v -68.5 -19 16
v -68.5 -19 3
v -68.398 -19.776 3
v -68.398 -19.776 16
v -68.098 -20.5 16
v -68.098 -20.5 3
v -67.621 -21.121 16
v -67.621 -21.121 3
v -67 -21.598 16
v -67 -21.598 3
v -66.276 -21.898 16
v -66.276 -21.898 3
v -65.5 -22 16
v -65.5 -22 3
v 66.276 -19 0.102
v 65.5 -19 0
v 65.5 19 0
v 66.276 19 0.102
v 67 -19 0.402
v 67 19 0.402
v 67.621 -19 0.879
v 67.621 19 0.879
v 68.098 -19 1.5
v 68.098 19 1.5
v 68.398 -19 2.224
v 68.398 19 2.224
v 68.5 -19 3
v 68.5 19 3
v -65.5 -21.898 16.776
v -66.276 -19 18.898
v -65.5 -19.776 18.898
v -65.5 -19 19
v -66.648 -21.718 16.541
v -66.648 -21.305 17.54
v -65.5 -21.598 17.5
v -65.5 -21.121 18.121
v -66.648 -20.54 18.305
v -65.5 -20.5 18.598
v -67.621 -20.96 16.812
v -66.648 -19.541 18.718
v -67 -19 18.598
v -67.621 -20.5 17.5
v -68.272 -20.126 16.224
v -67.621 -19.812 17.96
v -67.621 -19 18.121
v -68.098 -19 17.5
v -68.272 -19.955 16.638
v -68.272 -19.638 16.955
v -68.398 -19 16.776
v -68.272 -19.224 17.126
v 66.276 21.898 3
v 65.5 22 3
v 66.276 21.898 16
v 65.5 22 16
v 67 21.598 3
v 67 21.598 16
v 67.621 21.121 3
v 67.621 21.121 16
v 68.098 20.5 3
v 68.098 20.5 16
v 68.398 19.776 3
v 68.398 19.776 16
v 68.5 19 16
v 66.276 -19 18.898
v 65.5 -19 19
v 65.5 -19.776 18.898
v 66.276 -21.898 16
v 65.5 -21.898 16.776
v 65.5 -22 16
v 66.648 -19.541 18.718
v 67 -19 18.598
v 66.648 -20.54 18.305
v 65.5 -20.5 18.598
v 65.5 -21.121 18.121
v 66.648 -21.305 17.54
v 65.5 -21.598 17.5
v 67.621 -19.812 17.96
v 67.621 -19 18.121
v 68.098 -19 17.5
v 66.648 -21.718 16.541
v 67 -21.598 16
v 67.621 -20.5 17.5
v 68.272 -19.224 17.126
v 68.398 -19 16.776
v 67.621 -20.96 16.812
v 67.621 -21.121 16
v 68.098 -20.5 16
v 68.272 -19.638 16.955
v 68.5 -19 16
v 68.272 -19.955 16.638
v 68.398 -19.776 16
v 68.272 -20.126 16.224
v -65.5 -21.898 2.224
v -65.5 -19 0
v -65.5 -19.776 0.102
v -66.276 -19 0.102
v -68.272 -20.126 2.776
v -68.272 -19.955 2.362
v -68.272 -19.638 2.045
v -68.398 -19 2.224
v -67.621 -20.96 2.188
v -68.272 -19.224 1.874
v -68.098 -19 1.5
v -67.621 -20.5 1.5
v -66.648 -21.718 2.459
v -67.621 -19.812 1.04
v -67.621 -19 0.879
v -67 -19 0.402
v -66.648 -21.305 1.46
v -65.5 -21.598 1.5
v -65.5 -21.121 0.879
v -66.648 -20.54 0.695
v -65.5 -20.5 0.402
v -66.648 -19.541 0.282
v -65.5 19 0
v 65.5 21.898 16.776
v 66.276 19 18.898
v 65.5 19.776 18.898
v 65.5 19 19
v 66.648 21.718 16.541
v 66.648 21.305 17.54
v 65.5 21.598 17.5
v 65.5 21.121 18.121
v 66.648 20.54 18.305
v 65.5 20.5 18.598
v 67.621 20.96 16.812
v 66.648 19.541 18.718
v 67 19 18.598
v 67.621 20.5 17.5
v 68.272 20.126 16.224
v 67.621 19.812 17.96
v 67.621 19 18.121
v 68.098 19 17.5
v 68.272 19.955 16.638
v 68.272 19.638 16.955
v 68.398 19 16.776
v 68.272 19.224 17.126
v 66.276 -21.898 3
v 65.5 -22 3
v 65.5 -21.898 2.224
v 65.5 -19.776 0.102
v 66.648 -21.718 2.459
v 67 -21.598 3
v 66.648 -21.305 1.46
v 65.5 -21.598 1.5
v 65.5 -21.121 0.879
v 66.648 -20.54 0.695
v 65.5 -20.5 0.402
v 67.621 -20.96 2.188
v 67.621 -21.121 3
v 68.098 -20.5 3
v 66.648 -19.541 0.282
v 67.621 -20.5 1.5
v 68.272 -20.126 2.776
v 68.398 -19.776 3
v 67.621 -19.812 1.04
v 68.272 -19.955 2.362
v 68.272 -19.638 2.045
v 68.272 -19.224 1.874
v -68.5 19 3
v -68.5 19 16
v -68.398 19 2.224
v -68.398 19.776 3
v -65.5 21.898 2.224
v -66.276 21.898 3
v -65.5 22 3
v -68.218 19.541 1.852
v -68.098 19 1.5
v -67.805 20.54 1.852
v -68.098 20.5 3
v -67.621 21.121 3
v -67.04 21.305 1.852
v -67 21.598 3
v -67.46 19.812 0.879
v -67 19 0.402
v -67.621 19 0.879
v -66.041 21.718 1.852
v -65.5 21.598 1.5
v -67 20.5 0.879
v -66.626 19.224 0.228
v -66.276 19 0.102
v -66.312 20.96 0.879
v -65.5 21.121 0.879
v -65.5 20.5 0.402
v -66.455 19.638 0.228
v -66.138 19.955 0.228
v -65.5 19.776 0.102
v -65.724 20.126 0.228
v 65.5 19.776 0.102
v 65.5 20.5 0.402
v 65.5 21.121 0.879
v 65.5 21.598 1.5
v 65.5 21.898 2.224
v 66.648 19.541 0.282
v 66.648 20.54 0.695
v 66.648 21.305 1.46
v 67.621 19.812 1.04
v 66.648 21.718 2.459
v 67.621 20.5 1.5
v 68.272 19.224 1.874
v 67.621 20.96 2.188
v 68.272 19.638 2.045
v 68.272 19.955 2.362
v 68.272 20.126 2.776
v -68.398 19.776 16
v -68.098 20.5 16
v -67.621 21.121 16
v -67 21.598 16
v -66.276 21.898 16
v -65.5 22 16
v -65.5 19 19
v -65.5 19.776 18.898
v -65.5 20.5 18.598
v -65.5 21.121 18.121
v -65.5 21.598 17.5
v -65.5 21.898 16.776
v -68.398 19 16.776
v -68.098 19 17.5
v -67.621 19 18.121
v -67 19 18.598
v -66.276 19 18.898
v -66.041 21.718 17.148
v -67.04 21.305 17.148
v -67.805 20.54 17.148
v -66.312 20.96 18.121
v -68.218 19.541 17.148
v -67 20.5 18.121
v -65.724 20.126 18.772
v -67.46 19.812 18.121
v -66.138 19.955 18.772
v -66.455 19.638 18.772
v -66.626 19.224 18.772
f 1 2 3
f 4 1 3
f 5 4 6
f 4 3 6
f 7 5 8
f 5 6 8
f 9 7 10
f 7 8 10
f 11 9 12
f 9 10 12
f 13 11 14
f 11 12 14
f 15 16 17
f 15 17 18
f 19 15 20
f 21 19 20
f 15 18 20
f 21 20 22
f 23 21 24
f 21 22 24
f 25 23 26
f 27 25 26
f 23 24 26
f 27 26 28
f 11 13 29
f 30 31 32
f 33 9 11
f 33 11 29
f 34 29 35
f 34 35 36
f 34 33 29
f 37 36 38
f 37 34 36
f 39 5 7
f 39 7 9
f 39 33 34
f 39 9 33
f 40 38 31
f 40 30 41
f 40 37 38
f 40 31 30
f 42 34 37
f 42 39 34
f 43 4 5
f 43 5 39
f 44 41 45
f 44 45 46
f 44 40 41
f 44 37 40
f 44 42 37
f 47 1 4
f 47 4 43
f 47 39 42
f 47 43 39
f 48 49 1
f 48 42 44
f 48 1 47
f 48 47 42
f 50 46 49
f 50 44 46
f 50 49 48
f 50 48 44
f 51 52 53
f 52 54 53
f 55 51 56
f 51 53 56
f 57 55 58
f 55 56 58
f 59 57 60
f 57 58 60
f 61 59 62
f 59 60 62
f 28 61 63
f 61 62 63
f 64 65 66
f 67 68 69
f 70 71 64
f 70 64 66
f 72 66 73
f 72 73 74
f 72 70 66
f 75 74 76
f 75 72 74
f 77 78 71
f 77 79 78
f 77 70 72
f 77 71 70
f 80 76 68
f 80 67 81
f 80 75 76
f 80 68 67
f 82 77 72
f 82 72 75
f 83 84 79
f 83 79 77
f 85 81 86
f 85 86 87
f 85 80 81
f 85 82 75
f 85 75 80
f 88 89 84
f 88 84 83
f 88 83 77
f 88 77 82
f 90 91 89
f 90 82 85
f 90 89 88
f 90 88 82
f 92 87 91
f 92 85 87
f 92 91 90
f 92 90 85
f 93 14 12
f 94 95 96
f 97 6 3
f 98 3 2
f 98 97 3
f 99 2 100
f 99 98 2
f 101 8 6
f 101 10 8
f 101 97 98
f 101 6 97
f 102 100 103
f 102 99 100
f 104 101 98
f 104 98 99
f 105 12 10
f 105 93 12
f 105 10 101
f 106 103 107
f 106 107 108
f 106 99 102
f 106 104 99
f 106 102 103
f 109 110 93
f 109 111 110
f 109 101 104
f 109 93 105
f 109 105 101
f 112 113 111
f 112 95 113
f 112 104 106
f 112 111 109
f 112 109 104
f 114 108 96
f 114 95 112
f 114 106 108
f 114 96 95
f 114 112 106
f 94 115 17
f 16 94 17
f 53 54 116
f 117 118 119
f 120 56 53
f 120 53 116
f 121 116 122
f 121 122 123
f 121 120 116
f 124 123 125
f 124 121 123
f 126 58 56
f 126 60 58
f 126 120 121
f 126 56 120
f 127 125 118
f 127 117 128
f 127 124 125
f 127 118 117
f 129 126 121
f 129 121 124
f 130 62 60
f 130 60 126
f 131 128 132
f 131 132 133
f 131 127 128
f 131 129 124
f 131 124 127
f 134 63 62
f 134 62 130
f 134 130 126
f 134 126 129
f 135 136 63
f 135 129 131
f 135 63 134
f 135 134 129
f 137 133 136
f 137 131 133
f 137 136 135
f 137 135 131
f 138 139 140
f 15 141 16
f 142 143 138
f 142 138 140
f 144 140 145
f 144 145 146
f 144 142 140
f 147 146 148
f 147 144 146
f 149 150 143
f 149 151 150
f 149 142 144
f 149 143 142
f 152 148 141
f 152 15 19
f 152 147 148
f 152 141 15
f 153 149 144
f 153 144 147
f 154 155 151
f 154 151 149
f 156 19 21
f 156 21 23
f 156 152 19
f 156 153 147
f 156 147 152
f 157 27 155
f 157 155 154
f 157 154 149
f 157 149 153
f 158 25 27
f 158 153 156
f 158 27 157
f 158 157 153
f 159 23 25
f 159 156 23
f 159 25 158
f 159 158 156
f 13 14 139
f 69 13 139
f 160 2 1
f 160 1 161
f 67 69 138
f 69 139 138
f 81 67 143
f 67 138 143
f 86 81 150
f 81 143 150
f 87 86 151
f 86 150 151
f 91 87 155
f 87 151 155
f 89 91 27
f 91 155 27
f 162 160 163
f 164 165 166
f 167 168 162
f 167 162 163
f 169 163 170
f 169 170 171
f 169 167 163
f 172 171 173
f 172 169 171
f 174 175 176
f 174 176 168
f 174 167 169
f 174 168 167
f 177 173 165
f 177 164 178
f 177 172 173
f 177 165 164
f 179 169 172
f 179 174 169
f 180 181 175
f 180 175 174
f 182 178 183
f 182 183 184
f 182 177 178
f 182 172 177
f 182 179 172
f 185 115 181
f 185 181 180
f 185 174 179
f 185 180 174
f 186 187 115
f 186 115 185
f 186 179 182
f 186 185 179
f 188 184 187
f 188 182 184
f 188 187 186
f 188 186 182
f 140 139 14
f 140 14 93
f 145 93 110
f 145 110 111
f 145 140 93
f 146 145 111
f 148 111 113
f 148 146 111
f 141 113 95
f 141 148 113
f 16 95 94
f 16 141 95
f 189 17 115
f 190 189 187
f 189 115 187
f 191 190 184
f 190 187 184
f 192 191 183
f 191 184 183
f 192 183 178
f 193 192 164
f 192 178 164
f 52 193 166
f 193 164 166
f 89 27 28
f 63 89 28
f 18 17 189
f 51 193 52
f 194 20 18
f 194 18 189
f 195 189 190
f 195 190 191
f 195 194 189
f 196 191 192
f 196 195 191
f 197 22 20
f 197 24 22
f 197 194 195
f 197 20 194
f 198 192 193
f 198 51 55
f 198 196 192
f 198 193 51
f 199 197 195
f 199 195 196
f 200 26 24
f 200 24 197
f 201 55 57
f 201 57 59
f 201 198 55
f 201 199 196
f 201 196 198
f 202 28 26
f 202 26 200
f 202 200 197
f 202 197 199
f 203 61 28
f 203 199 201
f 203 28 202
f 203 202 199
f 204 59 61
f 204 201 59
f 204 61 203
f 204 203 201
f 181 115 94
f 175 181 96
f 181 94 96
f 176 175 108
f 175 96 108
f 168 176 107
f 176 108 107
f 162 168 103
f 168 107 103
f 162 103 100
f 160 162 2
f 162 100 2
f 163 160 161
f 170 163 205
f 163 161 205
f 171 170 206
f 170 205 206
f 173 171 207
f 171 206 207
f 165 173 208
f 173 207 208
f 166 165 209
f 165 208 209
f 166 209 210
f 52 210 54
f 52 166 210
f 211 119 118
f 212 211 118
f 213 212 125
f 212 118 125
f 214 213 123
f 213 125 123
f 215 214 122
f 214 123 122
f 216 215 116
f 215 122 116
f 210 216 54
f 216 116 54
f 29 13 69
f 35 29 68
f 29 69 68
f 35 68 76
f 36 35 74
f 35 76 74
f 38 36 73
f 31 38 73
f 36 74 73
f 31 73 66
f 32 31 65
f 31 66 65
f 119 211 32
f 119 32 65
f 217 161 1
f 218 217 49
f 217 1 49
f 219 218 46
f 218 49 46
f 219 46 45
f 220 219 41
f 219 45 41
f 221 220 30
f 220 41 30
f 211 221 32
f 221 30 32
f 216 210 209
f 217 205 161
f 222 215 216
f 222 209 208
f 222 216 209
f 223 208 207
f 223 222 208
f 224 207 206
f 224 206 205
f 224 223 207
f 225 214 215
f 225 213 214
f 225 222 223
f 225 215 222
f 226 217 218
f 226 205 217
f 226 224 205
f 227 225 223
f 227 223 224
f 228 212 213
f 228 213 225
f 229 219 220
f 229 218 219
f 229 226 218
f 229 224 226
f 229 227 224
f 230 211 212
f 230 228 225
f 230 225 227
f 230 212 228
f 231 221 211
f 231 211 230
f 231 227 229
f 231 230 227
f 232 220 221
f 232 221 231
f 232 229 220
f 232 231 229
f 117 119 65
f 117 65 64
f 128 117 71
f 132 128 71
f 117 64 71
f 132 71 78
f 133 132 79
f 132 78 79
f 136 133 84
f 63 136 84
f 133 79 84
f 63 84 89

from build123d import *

# Parameters (mm, degrees)
CROQUIS2_W              = 137
CROQUIS2_H              = 44
SALIENTE_EXTRUIR1_DEPTH = 19
REDONDEO3_R             = 3
REDONDEO4_R             = 3
REDONDEO5_R             = 3
REDONDEO6_R             = 3
REDONDEO7_R             = 3


with BuildPart() as part:
    # Croquis2 → Saliente-Extruir1 (new body)
    with BuildSketch(Plane.XY):
        Rectangle(CROQUIS2_W, CROQUIS2_H)
    extrude(amount=SALIENTE_EXTRUIR1_DEPTH)

    # Redondeo3
    redondeo3_edges = [part.edges().sort_by_distance(p)[0] for p in [
        (0, -22, 0),
    ]]
    fillet(redondeo3_edges, radius=REDONDEO3_R)

    # Redondeo4
    redondeo4_edges = [part.edges().sort_by_distance(p)[0] for p in [
        (0, -22, 19),
    ]]
    fillet(redondeo4_edges, radius=REDONDEO4_R)

    # Redondeo5
    redondeo5_edges = [part.edges().sort_by_distance(p)[0] for p in [
        (0, 22, 19),
        (-68.5, 22, 9.5),
    ]]
    fillet(redondeo5_edges, radius=REDONDEO5_R)

    # Redondeo6
    # the kernel refuses this fillet: 3 mm, written as the material it takes off along each edge
    with BuildSketch(Plane(origin=(-65.5, 19, 16), x_dir=(-1, 0, 0), z_dir=(0, 0, 1))) as redondeo6_piece_1_section:
        Polygon((0, 0), (REDONDEO6_R, 0), (REDONDEO6_R, -REDONDEO6_R), (0, -REDONDEO6_R), align=None)
    redondeo6_piece_1 = extrude(amount=REDONDEO6_R, mode=Mode.PRIVATE)
    redondeo6_piece_1 = redondeo6_piece_1 - Plane(origin=(-65.5, 19, 16), x_dir=(0.7071067811865475, -0.7071067811865475, 0), z_dir=(0, 0, 1)) * Sphere(REDONDEO6_R, mode=Mode.PRIVATE)
    add(redondeo6_piece_1, mode=Mode.SUBTRACT)
    with BuildSketch(Plane(origin=(-68.5, -19, 3), x_dir=(0, -1, 0), z_dir=(0, 0, 1))) as redondeo6_piece_2:
        with BuildLine():
            CenterArc((3 - REDONDEO6_R, REDONDEO6_R), REDONDEO6_R, 270, 90)
            Line((3 - REDONDEO6_R, 0), (3, 0))
            Line((3, 0), (3, REDONDEO6_R))
        make_face()
    revolve(axis=Axis((-68.5, -19, 3), (1, 0, 0)), revolution_arc=90, mode=Mode.SUBTRACT)
    with BuildSketch(Plane(origin=(-68.5, -22, 3), x_dir=(1, 0, 0), z_dir=(0, 0, 1))) as redondeo6_piece_3:
        with BuildLine():
            CenterArc((REDONDEO6_R, REDONDEO6_R), REDONDEO6_R, 180, 90)
            Line((0, REDONDEO6_R), (0, 0))
            Line((0, 0), (REDONDEO6_R, 0))
        make_face()
    extrude(amount=13, mode=Mode.SUBTRACT)
    with BuildSketch(Plane(origin=(-68.5, -19, 16), x_dir=(0, -1, 0), z_dir=(0, 0, -1))) as redondeo6_piece_4:
        with BuildLine():
            CenterArc((3 - REDONDEO6_R, -REDONDEO6_R), REDONDEO6_R, 0, 90)
            Line((3 - REDONDEO6_R, 0), (3, 0))
            Line((3, 0), (3, -REDONDEO6_R))
        make_face()
    revolve(axis=Axis((-68.5, -19, 16), (-1, 0, 0)), revolution_arc=90, mode=Mode.SUBTRACT)
    with BuildSketch(Plane(origin=(-68.5, -19, 19), x_dir=(1, 0, 0), z_dir=(0, 1, 0))) as redondeo6_piece_5:
        with BuildLine():
            CenterArc((REDONDEO6_R, REDONDEO6_R), REDONDEO6_R, 180, 90)
            Line((0, REDONDEO6_R), (0, 0))
            Line((0, 0), (REDONDEO6_R, 0))
        make_face()
    extrude(amount=38, mode=Mode.SUBTRACT)
    with BuildSketch(Plane(origin=(-68.5, -19, 0), x_dir=(1, 0, 0), z_dir=(0, 1, 0))) as redondeo6_piece_6:
        with BuildLine():
            CenterArc((REDONDEO6_R, -REDONDEO6_R), REDONDEO6_R, 90, 90)
            Line((0, -REDONDEO6_R), (0, 0))
            Line((0, 0), (REDONDEO6_R, 0))
        make_face()
    extrude(amount=38, mode=Mode.SUBTRACT)
    with BuildSketch(Plane(origin=(-65.5, 19, 0), x_dir=(-1, 0, 0), z_dir=(0, -1, 0))) as redondeo6_piece_7:
        with BuildLine():
            CenterArc((3 - REDONDEO6_R, -REDONDEO6_R), REDONDEO6_R, 0, 90)
            Line((3, -REDONDEO6_R), (3, 0))
            Line((3, 0), (3 - REDONDEO6_R, 0))
        make_face()
    revolve(axis=Axis((-65.5, 19, 0), (0, 0, -1)), revolution_arc=90, mode=Mode.SUBTRACT)
    with BuildSketch(Plane(origin=(-65.5, 22, 0), x_dir=(0, 0, 1), z_dir=(1, 0, 0))) as redondeo6_piece_8:
        with BuildLine():
            CenterArc((REDONDEO6_R, REDONDEO6_R), REDONDEO6_R, 180, 90)
            Line((0, REDONDEO6_R), (0, 0))
            Line((0, 0), (REDONDEO6_R, 0))
        make_face()
    extrude(amount=141.5, mode=Mode.SUBTRACT)

    # Redondeo7
    redondeo7_edges = [part.edges().sort_by_distance(p)[0] for p in [
        (68.5, 0, 0),
        (68.5, -21.121320344, 0.878679656),
        (68.5, -22, 9.5),
        (68.5, 0, 19),
        (68.5, -21.121320344, 18.121320344),
        (68.5, 22, 9.5),
        (68.5, 21.121320344, 18.121320344),
        (68.5, 21.121320344, 0.878679656),
    ]]
    fillet(redondeo7_edges, radius=REDONDEO7_R)


solid = part.part
